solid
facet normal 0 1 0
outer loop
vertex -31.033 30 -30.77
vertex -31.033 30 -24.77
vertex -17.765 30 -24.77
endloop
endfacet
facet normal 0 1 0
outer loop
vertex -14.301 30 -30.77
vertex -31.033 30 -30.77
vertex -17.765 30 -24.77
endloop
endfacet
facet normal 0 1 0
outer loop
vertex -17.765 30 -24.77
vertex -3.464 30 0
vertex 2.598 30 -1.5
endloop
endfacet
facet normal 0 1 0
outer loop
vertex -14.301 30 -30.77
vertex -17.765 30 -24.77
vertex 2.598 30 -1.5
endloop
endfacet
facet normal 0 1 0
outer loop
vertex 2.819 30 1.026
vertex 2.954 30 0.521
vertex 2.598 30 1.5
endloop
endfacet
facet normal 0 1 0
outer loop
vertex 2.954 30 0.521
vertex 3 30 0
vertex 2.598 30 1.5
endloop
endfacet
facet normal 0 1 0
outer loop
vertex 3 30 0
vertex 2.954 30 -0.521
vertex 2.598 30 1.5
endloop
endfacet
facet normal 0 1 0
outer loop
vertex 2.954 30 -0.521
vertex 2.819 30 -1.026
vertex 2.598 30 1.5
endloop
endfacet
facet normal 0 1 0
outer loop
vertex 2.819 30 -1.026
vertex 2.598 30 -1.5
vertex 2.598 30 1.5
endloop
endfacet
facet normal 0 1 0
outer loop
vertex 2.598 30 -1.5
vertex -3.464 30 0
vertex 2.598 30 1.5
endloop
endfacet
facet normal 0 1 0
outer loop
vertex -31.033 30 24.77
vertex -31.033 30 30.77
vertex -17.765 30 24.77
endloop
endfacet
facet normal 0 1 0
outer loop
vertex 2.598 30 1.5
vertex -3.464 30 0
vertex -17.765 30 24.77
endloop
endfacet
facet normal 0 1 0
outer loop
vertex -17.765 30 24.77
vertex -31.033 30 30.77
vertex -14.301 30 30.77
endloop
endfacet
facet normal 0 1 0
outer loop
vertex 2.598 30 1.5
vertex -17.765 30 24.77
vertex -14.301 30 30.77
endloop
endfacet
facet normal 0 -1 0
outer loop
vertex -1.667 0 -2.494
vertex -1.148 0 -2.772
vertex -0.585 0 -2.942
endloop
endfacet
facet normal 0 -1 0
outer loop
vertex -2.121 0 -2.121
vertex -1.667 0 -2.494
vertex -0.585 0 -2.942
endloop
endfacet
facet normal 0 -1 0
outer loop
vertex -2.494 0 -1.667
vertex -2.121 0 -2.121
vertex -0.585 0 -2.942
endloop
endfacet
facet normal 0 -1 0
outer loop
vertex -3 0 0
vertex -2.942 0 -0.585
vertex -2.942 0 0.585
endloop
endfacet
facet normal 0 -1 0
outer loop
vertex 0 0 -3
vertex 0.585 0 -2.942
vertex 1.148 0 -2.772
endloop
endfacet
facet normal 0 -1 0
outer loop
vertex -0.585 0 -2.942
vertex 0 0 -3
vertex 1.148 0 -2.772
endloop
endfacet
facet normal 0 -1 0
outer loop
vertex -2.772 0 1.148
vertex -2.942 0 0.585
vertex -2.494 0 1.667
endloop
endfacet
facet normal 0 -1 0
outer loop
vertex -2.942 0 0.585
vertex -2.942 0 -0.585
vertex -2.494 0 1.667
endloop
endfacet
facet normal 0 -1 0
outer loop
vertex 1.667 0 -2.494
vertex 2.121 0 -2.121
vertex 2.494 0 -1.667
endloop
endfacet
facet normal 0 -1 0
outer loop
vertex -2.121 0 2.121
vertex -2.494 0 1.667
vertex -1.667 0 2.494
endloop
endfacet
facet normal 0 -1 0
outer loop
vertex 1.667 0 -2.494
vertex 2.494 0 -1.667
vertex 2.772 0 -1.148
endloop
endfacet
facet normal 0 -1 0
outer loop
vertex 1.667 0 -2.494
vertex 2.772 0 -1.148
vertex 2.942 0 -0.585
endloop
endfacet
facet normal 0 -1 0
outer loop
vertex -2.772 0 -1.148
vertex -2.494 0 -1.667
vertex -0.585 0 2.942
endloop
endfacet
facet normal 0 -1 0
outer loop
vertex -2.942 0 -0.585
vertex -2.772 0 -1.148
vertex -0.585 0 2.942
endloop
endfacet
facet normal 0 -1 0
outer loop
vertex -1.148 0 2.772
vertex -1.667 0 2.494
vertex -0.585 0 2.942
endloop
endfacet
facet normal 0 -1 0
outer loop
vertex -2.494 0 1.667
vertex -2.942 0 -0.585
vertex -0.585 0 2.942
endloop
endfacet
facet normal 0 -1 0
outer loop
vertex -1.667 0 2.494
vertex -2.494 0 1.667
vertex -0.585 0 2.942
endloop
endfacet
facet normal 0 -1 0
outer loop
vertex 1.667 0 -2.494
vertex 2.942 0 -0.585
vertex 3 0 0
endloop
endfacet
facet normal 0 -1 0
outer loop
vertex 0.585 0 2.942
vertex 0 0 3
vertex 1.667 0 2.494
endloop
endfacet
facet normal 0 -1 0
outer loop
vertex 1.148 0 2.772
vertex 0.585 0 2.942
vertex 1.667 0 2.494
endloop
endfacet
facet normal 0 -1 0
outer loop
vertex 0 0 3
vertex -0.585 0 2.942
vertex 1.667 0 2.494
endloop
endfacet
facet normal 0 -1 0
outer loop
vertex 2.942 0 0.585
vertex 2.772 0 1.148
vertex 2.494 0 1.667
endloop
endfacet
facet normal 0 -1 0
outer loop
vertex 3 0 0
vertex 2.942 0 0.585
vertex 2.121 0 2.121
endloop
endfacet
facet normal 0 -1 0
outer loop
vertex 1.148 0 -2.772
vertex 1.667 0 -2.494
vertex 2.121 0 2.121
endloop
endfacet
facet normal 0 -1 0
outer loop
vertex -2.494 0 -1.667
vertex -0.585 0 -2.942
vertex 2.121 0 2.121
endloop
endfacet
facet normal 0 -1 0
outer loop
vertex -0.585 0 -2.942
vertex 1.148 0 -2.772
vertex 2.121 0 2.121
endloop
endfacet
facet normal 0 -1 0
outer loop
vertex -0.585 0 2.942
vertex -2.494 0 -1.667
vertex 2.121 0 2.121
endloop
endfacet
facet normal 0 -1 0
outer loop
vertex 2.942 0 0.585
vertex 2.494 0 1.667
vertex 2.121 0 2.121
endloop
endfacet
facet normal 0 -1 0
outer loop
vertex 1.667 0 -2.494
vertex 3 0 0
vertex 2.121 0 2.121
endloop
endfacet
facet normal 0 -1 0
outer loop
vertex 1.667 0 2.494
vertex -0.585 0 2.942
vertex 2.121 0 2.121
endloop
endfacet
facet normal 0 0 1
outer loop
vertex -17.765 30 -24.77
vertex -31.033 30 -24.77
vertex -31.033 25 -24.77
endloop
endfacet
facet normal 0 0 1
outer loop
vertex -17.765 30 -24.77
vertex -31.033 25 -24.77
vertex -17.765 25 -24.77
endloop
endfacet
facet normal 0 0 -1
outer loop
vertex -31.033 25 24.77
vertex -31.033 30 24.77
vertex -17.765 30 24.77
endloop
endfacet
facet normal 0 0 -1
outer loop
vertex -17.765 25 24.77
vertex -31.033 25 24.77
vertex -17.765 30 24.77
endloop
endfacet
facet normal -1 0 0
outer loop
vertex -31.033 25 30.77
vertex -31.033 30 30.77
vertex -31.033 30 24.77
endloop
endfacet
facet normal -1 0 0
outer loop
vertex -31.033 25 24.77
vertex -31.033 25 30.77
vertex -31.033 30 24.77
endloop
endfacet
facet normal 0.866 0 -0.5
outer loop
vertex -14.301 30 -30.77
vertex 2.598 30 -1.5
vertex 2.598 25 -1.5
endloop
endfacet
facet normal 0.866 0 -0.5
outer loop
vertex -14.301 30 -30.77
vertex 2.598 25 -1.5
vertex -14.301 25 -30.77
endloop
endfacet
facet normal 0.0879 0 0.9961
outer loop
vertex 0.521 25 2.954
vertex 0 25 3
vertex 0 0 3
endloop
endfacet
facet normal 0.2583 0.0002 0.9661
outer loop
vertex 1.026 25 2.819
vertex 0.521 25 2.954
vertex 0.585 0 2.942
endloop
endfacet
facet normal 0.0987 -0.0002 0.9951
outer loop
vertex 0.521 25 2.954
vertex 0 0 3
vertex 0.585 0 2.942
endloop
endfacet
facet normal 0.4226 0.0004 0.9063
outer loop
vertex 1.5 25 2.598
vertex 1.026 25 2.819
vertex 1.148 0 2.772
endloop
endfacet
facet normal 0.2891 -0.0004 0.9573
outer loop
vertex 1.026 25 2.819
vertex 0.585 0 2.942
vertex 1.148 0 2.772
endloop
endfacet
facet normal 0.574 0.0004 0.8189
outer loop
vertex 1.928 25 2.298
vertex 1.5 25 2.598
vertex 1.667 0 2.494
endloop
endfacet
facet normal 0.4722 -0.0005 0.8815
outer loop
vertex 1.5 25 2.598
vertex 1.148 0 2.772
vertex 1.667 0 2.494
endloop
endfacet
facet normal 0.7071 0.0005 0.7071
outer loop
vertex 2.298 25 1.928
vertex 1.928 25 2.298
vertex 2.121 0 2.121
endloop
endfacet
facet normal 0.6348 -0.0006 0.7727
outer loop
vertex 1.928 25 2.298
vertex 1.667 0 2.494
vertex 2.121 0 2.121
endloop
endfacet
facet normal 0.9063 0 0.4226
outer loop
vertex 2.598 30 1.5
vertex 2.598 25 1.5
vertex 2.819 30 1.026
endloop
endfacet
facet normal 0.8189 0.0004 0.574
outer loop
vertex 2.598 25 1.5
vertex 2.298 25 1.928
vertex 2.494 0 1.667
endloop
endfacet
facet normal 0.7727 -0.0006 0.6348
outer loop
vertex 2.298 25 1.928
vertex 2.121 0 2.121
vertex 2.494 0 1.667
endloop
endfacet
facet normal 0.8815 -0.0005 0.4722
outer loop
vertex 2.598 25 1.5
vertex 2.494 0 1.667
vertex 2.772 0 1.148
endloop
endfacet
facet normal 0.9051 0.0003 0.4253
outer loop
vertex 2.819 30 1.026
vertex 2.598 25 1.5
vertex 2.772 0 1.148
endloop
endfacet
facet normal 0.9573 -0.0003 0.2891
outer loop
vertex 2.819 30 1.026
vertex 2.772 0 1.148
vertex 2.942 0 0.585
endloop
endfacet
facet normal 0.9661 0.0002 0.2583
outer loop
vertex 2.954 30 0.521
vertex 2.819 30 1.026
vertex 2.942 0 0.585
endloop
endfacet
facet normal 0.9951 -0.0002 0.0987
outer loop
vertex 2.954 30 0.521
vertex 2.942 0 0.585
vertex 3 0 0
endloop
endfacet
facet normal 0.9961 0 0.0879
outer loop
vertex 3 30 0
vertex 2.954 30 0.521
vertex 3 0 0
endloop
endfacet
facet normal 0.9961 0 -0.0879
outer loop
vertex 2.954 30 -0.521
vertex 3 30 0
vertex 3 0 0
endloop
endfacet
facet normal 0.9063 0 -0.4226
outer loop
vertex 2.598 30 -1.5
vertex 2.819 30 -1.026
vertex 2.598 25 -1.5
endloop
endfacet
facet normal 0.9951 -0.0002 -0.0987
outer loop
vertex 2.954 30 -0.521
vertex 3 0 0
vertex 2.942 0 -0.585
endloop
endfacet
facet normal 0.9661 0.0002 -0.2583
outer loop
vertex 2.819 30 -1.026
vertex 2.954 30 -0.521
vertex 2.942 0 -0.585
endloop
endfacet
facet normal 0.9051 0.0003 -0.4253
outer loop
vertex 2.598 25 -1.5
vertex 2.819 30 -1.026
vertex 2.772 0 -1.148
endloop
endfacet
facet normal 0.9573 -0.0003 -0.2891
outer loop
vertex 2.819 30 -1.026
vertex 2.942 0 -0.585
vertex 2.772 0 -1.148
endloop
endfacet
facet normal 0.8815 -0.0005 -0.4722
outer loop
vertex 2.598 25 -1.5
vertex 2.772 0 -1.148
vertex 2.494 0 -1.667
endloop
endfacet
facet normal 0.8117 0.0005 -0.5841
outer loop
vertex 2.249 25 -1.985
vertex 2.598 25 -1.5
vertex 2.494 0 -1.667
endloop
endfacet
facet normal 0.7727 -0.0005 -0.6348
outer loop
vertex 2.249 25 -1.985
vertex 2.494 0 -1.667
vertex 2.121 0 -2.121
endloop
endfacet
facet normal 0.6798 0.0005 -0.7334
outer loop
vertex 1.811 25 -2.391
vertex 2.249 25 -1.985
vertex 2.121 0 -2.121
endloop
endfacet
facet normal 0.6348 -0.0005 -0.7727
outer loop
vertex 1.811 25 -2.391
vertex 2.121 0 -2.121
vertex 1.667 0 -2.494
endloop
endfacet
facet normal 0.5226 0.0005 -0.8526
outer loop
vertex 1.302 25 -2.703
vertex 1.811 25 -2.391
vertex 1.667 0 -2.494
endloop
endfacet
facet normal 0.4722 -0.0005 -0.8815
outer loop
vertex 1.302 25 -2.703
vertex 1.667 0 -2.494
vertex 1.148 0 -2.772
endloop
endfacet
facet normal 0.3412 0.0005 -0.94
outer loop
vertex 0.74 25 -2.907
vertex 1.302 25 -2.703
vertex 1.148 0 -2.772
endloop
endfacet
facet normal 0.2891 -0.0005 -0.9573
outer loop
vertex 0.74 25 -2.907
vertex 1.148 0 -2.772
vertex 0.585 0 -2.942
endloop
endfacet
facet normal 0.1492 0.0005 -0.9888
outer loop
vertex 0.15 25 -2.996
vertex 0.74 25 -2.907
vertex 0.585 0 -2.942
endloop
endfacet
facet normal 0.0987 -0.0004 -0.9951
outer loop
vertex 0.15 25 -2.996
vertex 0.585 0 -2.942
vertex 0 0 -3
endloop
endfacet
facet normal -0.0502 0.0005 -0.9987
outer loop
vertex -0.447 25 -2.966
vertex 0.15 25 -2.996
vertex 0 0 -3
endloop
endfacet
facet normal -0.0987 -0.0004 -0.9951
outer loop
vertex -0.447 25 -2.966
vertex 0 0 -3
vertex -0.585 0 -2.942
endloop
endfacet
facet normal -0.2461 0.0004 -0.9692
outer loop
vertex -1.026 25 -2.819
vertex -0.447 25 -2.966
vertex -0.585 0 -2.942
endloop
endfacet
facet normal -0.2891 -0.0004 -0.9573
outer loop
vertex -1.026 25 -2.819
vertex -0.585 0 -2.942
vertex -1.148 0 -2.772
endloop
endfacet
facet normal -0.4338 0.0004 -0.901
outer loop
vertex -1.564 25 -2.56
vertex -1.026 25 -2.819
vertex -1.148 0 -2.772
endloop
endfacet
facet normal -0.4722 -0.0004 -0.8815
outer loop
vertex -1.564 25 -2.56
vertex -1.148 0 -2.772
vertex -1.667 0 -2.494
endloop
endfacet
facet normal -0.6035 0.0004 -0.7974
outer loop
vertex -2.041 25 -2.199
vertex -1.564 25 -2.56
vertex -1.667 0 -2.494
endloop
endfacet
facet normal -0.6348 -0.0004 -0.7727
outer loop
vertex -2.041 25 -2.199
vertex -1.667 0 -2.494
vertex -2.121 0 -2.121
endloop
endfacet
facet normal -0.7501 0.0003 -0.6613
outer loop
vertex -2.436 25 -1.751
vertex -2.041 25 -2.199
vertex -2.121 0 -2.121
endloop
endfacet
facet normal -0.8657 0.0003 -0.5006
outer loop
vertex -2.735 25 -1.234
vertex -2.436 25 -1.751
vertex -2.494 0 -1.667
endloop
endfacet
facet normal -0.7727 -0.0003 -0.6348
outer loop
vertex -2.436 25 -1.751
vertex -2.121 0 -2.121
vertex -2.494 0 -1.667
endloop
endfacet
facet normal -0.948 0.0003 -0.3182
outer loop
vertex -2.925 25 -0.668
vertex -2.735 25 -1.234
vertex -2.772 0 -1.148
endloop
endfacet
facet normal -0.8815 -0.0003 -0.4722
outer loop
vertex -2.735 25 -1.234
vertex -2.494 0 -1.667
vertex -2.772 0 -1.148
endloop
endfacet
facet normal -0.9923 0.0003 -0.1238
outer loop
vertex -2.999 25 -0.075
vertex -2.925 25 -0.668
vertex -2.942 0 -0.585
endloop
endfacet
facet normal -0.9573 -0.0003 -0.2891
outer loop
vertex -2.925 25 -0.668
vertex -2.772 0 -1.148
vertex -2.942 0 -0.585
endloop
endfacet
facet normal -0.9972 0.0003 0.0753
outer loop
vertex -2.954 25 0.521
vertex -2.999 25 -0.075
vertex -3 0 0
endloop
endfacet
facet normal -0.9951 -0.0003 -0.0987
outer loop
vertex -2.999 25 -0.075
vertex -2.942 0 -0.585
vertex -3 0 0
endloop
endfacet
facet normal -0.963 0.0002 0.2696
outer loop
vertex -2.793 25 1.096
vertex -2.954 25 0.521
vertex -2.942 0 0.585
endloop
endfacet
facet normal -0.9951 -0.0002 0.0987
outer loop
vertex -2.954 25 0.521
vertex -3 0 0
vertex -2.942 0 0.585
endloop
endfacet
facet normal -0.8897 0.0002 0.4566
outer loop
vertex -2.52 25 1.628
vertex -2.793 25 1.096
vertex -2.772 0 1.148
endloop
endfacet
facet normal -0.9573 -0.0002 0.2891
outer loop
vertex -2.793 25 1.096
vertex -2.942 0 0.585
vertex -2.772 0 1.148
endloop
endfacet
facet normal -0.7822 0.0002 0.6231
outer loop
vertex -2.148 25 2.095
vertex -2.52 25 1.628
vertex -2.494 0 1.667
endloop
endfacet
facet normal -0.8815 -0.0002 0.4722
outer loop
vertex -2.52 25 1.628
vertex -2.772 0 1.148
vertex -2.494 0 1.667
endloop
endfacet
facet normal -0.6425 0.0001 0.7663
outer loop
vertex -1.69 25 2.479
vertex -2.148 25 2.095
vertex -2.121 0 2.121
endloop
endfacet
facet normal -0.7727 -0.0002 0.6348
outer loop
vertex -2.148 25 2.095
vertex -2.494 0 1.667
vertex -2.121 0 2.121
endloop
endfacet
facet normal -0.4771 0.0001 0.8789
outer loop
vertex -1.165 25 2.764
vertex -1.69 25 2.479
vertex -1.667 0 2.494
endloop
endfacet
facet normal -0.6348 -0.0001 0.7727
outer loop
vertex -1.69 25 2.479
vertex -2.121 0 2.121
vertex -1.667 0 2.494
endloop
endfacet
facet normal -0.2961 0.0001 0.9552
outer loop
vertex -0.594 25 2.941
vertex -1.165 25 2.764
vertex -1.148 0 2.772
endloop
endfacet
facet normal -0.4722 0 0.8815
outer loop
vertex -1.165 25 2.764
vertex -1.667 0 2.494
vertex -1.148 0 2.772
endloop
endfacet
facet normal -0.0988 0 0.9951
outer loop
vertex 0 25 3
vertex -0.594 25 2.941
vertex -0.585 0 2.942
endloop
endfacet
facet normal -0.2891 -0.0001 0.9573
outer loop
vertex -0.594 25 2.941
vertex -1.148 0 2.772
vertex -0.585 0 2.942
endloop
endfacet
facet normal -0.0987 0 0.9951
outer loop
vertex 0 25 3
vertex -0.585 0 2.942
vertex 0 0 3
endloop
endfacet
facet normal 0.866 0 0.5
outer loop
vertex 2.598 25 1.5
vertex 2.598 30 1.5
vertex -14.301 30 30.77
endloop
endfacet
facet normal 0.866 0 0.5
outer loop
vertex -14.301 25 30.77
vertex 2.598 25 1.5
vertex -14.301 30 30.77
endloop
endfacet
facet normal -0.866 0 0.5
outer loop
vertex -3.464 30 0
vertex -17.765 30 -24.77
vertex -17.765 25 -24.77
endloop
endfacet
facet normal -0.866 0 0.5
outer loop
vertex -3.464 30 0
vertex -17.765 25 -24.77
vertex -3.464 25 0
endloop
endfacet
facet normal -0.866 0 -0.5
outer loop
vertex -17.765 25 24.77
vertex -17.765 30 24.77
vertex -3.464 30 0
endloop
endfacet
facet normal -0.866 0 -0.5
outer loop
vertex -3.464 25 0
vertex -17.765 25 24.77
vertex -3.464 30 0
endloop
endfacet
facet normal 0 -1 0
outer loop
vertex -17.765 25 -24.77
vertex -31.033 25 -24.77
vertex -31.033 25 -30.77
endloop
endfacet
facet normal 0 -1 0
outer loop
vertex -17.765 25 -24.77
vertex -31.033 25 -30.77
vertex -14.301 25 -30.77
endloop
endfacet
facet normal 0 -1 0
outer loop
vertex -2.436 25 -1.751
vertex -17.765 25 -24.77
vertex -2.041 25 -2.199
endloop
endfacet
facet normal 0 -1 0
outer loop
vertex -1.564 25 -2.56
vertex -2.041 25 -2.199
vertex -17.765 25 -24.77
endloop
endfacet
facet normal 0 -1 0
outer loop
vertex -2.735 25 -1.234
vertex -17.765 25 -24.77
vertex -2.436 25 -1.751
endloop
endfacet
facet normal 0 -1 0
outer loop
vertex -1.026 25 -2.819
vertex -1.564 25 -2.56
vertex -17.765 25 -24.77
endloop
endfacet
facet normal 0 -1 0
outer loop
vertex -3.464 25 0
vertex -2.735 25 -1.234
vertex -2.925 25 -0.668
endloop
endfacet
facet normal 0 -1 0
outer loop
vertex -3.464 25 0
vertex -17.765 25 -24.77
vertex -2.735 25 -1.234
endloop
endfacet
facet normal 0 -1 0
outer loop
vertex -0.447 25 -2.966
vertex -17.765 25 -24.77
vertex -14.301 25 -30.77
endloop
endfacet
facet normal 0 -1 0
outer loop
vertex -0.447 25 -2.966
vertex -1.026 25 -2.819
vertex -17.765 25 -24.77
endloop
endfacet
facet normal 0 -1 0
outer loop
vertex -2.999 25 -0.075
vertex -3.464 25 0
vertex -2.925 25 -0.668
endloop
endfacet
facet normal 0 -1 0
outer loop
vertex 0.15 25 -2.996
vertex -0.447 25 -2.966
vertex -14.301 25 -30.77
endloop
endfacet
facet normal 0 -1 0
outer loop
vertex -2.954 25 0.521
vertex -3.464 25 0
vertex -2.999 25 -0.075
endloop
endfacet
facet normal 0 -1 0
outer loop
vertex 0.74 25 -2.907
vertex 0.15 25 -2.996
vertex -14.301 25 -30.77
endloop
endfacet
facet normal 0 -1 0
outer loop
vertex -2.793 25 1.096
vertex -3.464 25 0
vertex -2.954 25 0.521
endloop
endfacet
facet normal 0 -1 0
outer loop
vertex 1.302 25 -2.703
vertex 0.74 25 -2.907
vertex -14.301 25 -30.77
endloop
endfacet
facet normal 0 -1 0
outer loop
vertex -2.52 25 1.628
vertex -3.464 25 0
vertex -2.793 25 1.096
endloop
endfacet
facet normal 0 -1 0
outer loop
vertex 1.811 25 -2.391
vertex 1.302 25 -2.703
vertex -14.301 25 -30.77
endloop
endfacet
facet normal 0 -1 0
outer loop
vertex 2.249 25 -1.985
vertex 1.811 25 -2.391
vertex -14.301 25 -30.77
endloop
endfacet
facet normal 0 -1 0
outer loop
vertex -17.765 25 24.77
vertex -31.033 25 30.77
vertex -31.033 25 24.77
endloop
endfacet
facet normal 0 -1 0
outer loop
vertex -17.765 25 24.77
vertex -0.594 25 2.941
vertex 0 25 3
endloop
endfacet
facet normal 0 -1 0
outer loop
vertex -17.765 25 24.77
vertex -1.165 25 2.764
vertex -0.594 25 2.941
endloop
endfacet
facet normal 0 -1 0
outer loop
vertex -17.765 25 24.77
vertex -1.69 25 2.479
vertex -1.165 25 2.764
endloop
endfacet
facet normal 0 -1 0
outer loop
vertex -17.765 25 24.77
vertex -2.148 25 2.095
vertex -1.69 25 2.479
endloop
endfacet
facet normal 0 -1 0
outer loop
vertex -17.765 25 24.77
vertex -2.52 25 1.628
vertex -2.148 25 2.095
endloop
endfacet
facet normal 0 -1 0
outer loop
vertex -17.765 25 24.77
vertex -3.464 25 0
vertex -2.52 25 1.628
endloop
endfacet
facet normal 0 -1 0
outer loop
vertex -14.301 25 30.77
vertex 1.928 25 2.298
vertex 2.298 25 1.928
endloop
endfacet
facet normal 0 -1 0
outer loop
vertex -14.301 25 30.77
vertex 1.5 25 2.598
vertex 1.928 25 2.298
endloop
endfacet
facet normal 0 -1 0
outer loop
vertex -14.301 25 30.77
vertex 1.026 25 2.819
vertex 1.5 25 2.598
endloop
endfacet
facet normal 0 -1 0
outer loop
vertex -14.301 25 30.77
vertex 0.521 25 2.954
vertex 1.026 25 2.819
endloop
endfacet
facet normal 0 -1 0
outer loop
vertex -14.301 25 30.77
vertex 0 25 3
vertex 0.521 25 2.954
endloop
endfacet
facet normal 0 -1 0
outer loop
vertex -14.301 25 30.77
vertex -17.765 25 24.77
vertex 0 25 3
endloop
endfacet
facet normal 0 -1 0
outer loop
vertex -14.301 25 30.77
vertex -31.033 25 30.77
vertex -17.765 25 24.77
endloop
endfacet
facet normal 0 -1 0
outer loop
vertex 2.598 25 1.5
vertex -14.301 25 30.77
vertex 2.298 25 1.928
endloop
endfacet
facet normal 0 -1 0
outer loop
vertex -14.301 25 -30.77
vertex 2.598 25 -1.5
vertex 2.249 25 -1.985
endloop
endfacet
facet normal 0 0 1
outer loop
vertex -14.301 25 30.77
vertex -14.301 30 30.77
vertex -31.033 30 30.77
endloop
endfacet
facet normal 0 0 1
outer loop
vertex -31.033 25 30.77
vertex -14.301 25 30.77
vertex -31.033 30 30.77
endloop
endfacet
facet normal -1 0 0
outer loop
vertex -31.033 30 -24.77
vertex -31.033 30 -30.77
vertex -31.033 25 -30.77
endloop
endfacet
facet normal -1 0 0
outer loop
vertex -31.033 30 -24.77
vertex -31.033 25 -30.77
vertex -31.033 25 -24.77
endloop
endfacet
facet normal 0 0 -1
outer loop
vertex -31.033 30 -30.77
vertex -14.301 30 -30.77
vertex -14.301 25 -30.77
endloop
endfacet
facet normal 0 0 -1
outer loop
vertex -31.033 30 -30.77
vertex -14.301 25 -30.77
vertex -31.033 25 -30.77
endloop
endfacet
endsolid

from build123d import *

# Parameters (mm, degrees)
SKETCH1_R             = 3
STEERING_COLUMN_DEPTH = 30
LEFT_HANDLE_BAR_DEPTH = 5


with BuildPart() as part:
    # Sketch1 → Steering Column (new body)
    with BuildSketch(Plane(origin=(0, 0, 0), x_dir=(1, 0, 0), z_dir=(0, 1, 0))):
        with Locations(Location((0, 0, 0), (0, 0, 270))):
            Circle(SKETCH1_R)
    extrude(amount=STEERING_COLUMN_DEPTH)

    # Sketch2 → Left Handle Bar (add)
    with BuildSketch(Plane(origin=(0, 30, 0), x_dir=(1, 0, 0), z_dir=(0, 1, 0))):
        Polygon((2.598076211, 1.5), (-14.300966168, 30.77), (-31.033016975, 30.77), (-31.033016975, 24.77), (-17.765067783, 24.77), (-2.598076211, -1.5), align=None)
    left_handle_bar = extrude(amount=-LEFT_HANDLE_BAR_DEPTH)

    # Mirror1: Left Handle Bar across plane
    add(left_handle_bar.mirror(Plane.XY))


solid = part.part
